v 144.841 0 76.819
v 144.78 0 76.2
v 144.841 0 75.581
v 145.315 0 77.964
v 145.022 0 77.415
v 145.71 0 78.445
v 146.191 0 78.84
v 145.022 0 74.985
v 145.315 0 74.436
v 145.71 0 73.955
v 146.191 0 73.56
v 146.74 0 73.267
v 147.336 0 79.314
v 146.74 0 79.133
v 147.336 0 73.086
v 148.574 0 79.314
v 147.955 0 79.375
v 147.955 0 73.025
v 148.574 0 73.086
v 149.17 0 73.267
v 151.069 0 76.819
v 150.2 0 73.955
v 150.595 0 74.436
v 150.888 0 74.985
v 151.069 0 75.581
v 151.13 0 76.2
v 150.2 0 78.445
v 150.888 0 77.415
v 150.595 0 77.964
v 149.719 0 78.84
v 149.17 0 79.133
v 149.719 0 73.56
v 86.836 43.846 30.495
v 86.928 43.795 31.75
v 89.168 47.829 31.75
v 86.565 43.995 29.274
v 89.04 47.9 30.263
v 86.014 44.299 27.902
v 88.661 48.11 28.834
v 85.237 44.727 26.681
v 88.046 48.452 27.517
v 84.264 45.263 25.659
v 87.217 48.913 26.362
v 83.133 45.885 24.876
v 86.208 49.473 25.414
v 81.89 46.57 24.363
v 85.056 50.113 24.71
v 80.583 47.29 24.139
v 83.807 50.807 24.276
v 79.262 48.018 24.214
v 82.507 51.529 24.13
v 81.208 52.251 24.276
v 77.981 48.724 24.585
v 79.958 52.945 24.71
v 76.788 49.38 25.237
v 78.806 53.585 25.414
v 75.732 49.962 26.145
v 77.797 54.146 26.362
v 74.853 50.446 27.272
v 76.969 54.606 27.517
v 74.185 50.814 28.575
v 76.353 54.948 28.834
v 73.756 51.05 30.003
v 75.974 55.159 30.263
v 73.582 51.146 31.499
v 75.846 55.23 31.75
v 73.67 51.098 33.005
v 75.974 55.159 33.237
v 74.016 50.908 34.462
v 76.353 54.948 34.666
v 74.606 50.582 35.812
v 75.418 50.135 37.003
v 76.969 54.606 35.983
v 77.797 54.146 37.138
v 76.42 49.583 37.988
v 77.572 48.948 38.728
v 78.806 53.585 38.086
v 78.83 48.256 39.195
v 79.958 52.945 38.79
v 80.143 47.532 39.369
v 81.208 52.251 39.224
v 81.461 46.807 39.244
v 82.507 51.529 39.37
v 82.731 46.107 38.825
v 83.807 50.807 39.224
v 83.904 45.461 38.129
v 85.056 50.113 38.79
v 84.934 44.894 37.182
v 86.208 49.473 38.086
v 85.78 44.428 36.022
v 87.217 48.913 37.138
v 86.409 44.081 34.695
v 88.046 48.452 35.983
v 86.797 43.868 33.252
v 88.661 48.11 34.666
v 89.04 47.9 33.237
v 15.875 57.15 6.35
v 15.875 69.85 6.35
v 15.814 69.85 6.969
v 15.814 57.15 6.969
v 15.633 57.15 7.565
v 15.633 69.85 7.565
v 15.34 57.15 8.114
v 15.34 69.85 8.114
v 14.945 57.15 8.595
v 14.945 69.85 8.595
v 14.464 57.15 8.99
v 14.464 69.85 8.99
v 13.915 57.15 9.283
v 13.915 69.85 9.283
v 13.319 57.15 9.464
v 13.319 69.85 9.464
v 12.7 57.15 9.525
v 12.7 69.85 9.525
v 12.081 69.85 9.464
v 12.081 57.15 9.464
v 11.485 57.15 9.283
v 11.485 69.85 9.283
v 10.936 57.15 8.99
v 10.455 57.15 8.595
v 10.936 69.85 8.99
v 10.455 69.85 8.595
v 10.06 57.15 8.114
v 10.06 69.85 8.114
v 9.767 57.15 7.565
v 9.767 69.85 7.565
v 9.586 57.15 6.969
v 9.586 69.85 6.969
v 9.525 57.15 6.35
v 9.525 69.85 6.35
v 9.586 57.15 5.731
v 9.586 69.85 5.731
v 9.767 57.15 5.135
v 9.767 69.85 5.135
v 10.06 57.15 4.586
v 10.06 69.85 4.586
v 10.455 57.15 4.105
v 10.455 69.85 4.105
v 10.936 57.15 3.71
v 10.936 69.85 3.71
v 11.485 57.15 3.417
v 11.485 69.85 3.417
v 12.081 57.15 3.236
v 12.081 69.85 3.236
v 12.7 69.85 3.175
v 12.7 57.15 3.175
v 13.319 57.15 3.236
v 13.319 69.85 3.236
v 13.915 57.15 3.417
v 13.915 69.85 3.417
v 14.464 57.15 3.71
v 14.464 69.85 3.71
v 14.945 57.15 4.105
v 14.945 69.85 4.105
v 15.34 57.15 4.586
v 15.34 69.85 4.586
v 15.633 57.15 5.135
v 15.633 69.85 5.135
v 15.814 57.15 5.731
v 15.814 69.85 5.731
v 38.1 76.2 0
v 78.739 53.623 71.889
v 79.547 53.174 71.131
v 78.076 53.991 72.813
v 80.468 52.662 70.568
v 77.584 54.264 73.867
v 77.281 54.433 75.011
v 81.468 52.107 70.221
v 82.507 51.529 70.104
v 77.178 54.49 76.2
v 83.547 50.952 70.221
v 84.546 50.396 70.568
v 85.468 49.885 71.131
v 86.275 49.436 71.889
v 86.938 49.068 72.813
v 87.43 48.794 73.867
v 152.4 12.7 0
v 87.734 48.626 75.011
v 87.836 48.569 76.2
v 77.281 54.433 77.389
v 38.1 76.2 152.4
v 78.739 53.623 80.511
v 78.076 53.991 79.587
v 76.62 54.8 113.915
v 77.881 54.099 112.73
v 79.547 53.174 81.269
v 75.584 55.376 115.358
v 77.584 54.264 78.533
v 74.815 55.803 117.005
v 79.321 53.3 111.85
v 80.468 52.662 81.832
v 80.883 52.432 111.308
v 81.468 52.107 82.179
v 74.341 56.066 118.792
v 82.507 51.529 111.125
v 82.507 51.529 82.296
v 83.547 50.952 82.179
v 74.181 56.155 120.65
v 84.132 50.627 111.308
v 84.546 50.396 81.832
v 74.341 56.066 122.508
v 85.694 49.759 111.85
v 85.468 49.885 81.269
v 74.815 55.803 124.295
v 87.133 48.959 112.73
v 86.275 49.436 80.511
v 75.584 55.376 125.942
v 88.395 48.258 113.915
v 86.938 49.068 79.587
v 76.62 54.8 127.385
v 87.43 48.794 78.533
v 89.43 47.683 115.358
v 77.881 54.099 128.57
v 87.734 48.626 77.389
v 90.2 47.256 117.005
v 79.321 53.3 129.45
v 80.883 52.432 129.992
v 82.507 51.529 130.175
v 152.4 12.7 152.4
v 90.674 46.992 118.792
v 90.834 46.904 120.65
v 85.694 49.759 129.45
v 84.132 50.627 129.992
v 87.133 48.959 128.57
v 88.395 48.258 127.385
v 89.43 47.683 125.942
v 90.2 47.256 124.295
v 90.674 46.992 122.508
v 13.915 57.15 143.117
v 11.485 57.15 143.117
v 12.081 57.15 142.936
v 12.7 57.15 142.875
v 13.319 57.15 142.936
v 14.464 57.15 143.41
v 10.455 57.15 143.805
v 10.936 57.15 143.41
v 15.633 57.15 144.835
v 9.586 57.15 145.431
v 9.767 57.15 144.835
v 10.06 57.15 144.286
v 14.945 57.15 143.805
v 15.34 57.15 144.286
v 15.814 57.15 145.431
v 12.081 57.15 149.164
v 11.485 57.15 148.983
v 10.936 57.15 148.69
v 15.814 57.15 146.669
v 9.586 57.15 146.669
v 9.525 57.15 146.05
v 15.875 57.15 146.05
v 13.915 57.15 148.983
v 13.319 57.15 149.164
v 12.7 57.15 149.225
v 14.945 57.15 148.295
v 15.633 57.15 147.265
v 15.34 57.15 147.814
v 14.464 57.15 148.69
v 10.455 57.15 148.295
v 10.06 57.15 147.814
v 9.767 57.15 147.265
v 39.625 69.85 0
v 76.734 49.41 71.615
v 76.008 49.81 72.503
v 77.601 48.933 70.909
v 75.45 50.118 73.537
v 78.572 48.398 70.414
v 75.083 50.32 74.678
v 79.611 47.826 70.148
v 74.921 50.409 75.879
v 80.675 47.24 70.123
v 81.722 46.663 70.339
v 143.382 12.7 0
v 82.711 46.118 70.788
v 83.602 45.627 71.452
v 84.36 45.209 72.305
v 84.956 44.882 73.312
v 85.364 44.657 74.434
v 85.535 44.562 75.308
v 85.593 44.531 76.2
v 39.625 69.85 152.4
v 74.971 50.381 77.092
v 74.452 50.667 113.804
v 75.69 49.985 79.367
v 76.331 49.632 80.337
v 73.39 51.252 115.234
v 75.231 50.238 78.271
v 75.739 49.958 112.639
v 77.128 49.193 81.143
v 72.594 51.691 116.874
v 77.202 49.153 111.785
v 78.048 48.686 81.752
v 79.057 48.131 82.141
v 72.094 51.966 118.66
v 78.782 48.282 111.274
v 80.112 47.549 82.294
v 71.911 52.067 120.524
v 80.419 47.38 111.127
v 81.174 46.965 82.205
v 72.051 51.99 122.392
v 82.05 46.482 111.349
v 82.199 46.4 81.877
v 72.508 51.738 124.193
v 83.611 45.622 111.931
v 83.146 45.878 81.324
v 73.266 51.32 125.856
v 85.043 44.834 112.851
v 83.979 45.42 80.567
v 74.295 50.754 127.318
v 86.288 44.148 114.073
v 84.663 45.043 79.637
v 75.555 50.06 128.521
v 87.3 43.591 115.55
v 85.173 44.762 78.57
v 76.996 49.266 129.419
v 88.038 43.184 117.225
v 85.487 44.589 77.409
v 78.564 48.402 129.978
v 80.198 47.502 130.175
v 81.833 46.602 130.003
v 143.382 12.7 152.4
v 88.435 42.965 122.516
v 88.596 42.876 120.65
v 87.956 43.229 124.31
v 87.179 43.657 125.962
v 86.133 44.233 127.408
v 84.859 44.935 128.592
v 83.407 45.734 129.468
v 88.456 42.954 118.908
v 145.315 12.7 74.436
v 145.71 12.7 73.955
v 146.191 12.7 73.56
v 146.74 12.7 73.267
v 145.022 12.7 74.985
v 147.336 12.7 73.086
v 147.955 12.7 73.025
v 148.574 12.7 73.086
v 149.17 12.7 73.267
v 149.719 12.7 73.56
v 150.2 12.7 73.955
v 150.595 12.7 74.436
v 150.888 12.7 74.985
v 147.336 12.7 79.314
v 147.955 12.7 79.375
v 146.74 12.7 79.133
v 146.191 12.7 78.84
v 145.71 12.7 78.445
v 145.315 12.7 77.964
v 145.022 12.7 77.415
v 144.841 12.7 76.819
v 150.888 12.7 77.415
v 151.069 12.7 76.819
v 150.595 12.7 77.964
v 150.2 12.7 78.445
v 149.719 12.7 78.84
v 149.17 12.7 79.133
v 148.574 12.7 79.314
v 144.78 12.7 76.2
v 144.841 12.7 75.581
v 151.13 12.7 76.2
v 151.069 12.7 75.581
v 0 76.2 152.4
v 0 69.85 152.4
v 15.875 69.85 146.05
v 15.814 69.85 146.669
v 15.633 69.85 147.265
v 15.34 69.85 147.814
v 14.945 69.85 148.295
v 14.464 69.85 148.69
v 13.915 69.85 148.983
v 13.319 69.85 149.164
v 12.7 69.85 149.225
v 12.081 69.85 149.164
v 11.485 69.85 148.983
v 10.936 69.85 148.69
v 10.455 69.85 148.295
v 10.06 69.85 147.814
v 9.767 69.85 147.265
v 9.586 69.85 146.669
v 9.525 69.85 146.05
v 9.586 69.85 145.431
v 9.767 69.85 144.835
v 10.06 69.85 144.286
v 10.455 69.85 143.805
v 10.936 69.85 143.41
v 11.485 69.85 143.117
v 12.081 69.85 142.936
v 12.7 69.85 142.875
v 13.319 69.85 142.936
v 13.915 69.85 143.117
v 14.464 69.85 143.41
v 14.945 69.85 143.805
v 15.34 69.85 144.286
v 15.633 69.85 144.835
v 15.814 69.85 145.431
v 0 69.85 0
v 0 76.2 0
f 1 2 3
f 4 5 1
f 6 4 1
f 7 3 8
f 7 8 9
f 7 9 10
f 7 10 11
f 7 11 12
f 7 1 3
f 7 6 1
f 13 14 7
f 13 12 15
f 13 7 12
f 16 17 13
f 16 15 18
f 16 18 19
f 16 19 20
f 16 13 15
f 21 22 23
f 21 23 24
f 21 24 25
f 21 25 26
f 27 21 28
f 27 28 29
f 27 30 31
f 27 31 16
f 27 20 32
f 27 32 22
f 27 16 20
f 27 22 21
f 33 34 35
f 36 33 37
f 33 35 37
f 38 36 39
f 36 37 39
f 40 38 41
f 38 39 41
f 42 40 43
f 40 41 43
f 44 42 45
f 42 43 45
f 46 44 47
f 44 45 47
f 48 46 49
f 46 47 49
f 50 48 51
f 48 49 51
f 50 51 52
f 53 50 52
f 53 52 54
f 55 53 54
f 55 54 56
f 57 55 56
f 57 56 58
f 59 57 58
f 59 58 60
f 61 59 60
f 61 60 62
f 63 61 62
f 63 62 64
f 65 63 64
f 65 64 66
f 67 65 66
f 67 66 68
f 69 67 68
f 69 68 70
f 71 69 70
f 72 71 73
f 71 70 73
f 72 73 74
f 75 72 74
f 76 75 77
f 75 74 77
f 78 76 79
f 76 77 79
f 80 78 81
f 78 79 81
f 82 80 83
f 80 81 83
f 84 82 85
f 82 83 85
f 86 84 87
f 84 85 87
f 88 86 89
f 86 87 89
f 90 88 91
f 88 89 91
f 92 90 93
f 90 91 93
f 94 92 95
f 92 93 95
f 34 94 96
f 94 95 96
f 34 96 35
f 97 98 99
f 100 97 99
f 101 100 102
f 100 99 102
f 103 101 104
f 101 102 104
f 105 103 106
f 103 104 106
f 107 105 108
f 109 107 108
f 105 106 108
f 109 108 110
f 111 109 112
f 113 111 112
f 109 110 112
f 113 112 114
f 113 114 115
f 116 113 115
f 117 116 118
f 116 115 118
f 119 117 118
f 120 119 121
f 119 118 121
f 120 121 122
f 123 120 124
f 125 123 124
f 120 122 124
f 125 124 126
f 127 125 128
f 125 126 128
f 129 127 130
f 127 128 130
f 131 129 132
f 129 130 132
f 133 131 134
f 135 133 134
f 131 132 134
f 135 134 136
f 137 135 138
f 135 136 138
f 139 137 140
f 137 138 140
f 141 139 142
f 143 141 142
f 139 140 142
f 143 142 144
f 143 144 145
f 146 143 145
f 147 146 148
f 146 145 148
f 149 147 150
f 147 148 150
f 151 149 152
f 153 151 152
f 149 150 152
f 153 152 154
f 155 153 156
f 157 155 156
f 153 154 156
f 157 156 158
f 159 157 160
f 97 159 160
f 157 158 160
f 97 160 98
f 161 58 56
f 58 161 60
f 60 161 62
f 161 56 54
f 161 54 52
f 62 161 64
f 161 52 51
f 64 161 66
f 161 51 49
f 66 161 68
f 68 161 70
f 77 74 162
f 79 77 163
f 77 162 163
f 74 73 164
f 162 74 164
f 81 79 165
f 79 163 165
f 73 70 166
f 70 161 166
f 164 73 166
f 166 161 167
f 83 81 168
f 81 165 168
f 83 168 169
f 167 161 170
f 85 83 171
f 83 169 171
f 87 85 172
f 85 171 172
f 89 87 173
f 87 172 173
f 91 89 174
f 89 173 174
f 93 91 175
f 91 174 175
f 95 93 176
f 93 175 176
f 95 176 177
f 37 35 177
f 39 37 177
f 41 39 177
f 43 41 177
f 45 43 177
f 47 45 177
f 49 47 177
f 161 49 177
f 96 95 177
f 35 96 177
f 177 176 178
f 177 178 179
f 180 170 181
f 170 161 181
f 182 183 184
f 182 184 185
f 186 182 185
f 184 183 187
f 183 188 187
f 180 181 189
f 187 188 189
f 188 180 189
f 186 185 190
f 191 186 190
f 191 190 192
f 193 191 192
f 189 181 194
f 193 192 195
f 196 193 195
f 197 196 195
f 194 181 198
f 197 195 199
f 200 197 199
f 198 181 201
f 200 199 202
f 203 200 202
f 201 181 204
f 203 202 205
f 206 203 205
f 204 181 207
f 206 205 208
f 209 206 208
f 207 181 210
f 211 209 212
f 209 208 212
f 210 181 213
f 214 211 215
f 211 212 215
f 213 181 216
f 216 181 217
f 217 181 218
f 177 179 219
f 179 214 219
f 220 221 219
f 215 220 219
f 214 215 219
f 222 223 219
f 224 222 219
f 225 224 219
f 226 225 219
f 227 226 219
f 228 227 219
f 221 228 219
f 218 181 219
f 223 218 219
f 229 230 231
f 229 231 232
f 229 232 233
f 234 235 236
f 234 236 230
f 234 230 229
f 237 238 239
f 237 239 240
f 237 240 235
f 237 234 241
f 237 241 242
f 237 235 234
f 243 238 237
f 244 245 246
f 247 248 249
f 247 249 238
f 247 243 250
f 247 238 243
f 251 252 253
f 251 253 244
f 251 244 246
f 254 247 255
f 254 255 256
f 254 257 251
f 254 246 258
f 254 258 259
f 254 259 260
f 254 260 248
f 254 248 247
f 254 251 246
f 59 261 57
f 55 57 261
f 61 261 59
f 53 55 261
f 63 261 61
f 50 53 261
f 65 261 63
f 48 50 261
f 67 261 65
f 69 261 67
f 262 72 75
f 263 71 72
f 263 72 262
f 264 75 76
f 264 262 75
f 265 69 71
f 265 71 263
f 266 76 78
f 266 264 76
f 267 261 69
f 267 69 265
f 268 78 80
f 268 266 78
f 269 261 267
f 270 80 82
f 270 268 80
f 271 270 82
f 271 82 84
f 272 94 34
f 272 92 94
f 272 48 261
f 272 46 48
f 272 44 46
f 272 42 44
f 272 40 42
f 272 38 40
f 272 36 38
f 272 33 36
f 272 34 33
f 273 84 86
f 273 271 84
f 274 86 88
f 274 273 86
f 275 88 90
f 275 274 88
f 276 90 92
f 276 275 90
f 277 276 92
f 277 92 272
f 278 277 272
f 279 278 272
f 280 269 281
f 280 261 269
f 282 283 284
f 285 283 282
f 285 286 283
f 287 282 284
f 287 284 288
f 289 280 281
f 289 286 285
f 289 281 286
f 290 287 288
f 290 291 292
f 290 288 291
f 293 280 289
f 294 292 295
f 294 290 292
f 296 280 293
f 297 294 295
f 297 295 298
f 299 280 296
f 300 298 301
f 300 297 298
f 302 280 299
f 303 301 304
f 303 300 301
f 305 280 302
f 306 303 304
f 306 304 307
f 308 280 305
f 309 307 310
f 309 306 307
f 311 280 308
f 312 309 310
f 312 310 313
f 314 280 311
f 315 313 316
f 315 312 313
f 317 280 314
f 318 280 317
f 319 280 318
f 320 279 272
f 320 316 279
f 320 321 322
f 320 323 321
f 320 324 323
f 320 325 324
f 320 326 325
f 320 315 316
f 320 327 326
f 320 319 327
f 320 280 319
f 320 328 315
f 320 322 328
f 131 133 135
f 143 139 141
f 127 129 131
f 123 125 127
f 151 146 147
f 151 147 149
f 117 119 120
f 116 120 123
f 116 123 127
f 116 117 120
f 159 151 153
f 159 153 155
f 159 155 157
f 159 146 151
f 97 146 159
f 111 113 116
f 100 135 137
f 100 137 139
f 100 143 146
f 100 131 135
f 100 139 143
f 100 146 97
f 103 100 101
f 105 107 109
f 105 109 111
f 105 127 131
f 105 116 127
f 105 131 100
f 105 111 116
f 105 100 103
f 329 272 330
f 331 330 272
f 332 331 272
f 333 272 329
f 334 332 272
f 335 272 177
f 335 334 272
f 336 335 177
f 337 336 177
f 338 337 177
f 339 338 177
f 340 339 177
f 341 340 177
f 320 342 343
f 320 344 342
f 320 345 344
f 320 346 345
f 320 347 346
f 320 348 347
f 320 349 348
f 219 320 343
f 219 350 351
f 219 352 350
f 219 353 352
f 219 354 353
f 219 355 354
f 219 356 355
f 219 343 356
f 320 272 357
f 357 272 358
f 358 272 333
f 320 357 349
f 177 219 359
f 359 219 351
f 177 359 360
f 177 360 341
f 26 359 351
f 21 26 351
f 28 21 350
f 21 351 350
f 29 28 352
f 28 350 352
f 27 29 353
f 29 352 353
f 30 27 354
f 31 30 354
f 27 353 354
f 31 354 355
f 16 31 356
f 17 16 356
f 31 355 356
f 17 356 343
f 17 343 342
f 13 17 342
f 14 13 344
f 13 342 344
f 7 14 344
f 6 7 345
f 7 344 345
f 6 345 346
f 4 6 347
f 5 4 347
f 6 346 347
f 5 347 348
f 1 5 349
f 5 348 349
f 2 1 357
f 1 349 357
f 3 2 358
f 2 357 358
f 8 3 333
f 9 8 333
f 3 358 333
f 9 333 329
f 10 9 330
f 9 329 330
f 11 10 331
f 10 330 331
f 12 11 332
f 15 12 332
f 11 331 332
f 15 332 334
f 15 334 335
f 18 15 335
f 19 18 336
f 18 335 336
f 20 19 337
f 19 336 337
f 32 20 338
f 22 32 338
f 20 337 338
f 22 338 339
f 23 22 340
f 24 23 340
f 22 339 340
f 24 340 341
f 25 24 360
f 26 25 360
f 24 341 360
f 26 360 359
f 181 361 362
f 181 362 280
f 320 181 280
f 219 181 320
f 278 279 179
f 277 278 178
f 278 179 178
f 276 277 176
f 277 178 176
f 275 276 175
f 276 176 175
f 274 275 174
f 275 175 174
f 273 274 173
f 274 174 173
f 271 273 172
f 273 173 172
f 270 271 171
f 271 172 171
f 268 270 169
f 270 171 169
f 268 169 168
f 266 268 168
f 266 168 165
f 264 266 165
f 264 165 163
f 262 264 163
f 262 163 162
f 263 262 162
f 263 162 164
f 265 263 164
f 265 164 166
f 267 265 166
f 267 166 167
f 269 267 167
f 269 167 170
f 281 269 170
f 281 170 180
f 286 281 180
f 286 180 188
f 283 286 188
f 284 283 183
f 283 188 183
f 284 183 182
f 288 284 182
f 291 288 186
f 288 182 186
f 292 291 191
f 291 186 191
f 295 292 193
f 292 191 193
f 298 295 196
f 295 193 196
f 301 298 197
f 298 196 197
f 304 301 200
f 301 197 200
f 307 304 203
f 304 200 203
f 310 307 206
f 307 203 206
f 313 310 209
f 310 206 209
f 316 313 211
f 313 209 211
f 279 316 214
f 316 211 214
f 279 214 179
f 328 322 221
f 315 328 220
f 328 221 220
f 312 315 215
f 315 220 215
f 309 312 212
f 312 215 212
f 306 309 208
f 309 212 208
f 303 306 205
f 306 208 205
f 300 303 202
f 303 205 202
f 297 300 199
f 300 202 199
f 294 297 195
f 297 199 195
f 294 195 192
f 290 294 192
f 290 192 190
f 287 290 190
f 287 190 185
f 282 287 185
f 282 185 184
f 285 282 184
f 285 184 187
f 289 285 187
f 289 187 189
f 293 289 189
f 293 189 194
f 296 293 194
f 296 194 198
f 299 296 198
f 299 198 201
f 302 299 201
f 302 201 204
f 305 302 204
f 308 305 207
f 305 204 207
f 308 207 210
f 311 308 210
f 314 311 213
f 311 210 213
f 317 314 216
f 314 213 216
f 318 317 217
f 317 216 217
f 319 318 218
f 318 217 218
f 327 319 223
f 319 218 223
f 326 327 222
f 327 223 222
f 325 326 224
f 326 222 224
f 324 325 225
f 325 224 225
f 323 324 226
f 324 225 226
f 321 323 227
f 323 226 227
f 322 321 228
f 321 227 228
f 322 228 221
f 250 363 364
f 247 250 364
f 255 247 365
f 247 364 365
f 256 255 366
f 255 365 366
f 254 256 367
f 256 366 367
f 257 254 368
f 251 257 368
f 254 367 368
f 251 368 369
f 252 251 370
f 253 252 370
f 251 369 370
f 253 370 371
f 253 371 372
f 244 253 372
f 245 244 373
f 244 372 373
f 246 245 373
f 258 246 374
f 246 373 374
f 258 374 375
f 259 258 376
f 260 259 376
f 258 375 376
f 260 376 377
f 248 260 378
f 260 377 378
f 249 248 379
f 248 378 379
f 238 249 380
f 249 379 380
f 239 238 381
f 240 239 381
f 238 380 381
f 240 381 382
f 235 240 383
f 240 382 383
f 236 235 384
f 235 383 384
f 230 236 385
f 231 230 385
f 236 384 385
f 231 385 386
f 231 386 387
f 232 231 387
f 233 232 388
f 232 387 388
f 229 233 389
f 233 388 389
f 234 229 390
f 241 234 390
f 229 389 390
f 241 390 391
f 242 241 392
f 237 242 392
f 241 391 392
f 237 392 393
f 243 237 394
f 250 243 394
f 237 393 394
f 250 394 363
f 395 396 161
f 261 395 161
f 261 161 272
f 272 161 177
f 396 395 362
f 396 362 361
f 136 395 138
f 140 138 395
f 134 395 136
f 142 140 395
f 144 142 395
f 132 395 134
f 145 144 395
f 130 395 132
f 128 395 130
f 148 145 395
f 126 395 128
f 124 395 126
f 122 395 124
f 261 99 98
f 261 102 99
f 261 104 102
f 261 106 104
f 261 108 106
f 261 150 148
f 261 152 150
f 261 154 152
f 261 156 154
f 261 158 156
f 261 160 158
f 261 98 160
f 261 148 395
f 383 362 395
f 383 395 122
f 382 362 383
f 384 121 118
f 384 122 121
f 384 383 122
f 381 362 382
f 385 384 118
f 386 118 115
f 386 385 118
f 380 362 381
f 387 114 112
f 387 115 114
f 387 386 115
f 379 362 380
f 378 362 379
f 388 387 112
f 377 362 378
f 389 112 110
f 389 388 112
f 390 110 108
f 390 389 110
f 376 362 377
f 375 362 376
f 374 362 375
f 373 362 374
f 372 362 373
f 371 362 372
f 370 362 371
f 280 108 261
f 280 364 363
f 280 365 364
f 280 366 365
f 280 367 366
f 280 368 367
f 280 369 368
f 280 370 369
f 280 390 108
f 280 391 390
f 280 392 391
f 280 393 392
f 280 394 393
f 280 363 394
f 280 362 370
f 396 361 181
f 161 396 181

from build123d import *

# Parameters (mm, degrees)
SKETCH1_W           = 152.4
SKETCH1_H           = 76.2
BOSS_EXTRUDE1_DEPTH = 152.4
CUT_EXTRUDE1_DEPTH  = 152.4
CUT_EXTRUDE4_DEPTH  = 152.4
SKETCH6_R           = 9.525
SKETCH6_R_2         = 6.096
SKETCH6_R_3         = 7.62
CUT_EXTRUDE5_DEPTH  = 25.4
SKETCH7_R           = 3.175
BOSS_EXTRUDE2_DEPTH = 12.7
SKETCH8_W           = 9.01836237
SKETCH8_H           = 12.7
CUT_EXTRUDE6_DEPTH  = 152.4
SKETCH9_R           = 3.175
BOSS_EXTRUDE3_DEPTH = 12.7


with BuildPart() as part:
    # Sketch1 → Boss-Extrude1 (new body)
    with BuildSketch(Plane.XY):
        with Locations((76.2, 38.1)):
            Rectangle(SKETCH1_W, SKETCH1_H)
    extrude(amount=BOSS_EXTRUDE1_DEPTH)

    # Sketch2 → Cut-Extrude1 (cut)
    with BuildSketch(Plane.XY.offset(152.4)):
        Polygon((152.4, 76.2), (38.1, 76.2), (152.4, 12.7), align=None)
    extrude(amount=-CUT_EXTRUDE1_DEPTH, mode=Mode.SUBTRACT)

    # Sketch4 → Cut-Extrude4 (cut)
    with BuildSketch(Plane.XY.offset(152.4)):
        Polygon((39.625354208, 69.85), (146.05, 11.230239284), (146.05, 0), (0, 0), (0, 69.85), align=None)
    extrude(amount=-CUT_EXTRUDE4_DEPTH, mode=Mode.SUBTRACT)

    # Sketch6 → Cut-Extrude5 (cut)
    with BuildSketch(Plane(origin=(41.33490566, 74.402830189, 0), x_dir=(0.874157276, -0.485642931, 0), z_dir=(0.485642931, 0.874157276, 0))):
        with Locations((47.099400864, -120.65)):
            Circle(SKETCH6_R)
        with Locations((47.099400864, -76.2)):
            Circle(SKETCH6_R_2)
        with Locations((47.099400864, -31.75)):
            Circle(SKETCH6_R_3)
    extrude(amount=-CUT_EXTRUDE5_DEPTH, mode=Mode.SUBTRACT)

    # Sketch7 → Boss-Extrude2 (add)
    with BuildSketch(Plane.XZ.offset(-69.85)):
        with Locations((12.7, 6.35)):
            Circle(SKETCH7_R)
        with Locations((12.7, 146.05)):
            Circle(SKETCH7_R)
    extrude(amount=BOSS_EXTRUDE2_DEPTH)

    # Sketch8 → Cut-Extrude6 (cut)
    with BuildSketch(Plane.XY.offset(152.4)):
        with Locations((147.890818815, 6.35)):
            Rectangle(SKETCH8_W, SKETCH8_H)
    extrude(amount=-CUT_EXTRUDE6_DEPTH, mode=Mode.SUBTRACT)

    # Sketch9 → Boss-Extrude3 (add)
    with BuildSketch(Plane.XZ.offset(-12.7)):
        with Locations((147.955, 76.2)):
            Circle(SKETCH9_R)
    extrude(amount=BOSS_EXTRUDE3_DEPTH)


solid = part.part
